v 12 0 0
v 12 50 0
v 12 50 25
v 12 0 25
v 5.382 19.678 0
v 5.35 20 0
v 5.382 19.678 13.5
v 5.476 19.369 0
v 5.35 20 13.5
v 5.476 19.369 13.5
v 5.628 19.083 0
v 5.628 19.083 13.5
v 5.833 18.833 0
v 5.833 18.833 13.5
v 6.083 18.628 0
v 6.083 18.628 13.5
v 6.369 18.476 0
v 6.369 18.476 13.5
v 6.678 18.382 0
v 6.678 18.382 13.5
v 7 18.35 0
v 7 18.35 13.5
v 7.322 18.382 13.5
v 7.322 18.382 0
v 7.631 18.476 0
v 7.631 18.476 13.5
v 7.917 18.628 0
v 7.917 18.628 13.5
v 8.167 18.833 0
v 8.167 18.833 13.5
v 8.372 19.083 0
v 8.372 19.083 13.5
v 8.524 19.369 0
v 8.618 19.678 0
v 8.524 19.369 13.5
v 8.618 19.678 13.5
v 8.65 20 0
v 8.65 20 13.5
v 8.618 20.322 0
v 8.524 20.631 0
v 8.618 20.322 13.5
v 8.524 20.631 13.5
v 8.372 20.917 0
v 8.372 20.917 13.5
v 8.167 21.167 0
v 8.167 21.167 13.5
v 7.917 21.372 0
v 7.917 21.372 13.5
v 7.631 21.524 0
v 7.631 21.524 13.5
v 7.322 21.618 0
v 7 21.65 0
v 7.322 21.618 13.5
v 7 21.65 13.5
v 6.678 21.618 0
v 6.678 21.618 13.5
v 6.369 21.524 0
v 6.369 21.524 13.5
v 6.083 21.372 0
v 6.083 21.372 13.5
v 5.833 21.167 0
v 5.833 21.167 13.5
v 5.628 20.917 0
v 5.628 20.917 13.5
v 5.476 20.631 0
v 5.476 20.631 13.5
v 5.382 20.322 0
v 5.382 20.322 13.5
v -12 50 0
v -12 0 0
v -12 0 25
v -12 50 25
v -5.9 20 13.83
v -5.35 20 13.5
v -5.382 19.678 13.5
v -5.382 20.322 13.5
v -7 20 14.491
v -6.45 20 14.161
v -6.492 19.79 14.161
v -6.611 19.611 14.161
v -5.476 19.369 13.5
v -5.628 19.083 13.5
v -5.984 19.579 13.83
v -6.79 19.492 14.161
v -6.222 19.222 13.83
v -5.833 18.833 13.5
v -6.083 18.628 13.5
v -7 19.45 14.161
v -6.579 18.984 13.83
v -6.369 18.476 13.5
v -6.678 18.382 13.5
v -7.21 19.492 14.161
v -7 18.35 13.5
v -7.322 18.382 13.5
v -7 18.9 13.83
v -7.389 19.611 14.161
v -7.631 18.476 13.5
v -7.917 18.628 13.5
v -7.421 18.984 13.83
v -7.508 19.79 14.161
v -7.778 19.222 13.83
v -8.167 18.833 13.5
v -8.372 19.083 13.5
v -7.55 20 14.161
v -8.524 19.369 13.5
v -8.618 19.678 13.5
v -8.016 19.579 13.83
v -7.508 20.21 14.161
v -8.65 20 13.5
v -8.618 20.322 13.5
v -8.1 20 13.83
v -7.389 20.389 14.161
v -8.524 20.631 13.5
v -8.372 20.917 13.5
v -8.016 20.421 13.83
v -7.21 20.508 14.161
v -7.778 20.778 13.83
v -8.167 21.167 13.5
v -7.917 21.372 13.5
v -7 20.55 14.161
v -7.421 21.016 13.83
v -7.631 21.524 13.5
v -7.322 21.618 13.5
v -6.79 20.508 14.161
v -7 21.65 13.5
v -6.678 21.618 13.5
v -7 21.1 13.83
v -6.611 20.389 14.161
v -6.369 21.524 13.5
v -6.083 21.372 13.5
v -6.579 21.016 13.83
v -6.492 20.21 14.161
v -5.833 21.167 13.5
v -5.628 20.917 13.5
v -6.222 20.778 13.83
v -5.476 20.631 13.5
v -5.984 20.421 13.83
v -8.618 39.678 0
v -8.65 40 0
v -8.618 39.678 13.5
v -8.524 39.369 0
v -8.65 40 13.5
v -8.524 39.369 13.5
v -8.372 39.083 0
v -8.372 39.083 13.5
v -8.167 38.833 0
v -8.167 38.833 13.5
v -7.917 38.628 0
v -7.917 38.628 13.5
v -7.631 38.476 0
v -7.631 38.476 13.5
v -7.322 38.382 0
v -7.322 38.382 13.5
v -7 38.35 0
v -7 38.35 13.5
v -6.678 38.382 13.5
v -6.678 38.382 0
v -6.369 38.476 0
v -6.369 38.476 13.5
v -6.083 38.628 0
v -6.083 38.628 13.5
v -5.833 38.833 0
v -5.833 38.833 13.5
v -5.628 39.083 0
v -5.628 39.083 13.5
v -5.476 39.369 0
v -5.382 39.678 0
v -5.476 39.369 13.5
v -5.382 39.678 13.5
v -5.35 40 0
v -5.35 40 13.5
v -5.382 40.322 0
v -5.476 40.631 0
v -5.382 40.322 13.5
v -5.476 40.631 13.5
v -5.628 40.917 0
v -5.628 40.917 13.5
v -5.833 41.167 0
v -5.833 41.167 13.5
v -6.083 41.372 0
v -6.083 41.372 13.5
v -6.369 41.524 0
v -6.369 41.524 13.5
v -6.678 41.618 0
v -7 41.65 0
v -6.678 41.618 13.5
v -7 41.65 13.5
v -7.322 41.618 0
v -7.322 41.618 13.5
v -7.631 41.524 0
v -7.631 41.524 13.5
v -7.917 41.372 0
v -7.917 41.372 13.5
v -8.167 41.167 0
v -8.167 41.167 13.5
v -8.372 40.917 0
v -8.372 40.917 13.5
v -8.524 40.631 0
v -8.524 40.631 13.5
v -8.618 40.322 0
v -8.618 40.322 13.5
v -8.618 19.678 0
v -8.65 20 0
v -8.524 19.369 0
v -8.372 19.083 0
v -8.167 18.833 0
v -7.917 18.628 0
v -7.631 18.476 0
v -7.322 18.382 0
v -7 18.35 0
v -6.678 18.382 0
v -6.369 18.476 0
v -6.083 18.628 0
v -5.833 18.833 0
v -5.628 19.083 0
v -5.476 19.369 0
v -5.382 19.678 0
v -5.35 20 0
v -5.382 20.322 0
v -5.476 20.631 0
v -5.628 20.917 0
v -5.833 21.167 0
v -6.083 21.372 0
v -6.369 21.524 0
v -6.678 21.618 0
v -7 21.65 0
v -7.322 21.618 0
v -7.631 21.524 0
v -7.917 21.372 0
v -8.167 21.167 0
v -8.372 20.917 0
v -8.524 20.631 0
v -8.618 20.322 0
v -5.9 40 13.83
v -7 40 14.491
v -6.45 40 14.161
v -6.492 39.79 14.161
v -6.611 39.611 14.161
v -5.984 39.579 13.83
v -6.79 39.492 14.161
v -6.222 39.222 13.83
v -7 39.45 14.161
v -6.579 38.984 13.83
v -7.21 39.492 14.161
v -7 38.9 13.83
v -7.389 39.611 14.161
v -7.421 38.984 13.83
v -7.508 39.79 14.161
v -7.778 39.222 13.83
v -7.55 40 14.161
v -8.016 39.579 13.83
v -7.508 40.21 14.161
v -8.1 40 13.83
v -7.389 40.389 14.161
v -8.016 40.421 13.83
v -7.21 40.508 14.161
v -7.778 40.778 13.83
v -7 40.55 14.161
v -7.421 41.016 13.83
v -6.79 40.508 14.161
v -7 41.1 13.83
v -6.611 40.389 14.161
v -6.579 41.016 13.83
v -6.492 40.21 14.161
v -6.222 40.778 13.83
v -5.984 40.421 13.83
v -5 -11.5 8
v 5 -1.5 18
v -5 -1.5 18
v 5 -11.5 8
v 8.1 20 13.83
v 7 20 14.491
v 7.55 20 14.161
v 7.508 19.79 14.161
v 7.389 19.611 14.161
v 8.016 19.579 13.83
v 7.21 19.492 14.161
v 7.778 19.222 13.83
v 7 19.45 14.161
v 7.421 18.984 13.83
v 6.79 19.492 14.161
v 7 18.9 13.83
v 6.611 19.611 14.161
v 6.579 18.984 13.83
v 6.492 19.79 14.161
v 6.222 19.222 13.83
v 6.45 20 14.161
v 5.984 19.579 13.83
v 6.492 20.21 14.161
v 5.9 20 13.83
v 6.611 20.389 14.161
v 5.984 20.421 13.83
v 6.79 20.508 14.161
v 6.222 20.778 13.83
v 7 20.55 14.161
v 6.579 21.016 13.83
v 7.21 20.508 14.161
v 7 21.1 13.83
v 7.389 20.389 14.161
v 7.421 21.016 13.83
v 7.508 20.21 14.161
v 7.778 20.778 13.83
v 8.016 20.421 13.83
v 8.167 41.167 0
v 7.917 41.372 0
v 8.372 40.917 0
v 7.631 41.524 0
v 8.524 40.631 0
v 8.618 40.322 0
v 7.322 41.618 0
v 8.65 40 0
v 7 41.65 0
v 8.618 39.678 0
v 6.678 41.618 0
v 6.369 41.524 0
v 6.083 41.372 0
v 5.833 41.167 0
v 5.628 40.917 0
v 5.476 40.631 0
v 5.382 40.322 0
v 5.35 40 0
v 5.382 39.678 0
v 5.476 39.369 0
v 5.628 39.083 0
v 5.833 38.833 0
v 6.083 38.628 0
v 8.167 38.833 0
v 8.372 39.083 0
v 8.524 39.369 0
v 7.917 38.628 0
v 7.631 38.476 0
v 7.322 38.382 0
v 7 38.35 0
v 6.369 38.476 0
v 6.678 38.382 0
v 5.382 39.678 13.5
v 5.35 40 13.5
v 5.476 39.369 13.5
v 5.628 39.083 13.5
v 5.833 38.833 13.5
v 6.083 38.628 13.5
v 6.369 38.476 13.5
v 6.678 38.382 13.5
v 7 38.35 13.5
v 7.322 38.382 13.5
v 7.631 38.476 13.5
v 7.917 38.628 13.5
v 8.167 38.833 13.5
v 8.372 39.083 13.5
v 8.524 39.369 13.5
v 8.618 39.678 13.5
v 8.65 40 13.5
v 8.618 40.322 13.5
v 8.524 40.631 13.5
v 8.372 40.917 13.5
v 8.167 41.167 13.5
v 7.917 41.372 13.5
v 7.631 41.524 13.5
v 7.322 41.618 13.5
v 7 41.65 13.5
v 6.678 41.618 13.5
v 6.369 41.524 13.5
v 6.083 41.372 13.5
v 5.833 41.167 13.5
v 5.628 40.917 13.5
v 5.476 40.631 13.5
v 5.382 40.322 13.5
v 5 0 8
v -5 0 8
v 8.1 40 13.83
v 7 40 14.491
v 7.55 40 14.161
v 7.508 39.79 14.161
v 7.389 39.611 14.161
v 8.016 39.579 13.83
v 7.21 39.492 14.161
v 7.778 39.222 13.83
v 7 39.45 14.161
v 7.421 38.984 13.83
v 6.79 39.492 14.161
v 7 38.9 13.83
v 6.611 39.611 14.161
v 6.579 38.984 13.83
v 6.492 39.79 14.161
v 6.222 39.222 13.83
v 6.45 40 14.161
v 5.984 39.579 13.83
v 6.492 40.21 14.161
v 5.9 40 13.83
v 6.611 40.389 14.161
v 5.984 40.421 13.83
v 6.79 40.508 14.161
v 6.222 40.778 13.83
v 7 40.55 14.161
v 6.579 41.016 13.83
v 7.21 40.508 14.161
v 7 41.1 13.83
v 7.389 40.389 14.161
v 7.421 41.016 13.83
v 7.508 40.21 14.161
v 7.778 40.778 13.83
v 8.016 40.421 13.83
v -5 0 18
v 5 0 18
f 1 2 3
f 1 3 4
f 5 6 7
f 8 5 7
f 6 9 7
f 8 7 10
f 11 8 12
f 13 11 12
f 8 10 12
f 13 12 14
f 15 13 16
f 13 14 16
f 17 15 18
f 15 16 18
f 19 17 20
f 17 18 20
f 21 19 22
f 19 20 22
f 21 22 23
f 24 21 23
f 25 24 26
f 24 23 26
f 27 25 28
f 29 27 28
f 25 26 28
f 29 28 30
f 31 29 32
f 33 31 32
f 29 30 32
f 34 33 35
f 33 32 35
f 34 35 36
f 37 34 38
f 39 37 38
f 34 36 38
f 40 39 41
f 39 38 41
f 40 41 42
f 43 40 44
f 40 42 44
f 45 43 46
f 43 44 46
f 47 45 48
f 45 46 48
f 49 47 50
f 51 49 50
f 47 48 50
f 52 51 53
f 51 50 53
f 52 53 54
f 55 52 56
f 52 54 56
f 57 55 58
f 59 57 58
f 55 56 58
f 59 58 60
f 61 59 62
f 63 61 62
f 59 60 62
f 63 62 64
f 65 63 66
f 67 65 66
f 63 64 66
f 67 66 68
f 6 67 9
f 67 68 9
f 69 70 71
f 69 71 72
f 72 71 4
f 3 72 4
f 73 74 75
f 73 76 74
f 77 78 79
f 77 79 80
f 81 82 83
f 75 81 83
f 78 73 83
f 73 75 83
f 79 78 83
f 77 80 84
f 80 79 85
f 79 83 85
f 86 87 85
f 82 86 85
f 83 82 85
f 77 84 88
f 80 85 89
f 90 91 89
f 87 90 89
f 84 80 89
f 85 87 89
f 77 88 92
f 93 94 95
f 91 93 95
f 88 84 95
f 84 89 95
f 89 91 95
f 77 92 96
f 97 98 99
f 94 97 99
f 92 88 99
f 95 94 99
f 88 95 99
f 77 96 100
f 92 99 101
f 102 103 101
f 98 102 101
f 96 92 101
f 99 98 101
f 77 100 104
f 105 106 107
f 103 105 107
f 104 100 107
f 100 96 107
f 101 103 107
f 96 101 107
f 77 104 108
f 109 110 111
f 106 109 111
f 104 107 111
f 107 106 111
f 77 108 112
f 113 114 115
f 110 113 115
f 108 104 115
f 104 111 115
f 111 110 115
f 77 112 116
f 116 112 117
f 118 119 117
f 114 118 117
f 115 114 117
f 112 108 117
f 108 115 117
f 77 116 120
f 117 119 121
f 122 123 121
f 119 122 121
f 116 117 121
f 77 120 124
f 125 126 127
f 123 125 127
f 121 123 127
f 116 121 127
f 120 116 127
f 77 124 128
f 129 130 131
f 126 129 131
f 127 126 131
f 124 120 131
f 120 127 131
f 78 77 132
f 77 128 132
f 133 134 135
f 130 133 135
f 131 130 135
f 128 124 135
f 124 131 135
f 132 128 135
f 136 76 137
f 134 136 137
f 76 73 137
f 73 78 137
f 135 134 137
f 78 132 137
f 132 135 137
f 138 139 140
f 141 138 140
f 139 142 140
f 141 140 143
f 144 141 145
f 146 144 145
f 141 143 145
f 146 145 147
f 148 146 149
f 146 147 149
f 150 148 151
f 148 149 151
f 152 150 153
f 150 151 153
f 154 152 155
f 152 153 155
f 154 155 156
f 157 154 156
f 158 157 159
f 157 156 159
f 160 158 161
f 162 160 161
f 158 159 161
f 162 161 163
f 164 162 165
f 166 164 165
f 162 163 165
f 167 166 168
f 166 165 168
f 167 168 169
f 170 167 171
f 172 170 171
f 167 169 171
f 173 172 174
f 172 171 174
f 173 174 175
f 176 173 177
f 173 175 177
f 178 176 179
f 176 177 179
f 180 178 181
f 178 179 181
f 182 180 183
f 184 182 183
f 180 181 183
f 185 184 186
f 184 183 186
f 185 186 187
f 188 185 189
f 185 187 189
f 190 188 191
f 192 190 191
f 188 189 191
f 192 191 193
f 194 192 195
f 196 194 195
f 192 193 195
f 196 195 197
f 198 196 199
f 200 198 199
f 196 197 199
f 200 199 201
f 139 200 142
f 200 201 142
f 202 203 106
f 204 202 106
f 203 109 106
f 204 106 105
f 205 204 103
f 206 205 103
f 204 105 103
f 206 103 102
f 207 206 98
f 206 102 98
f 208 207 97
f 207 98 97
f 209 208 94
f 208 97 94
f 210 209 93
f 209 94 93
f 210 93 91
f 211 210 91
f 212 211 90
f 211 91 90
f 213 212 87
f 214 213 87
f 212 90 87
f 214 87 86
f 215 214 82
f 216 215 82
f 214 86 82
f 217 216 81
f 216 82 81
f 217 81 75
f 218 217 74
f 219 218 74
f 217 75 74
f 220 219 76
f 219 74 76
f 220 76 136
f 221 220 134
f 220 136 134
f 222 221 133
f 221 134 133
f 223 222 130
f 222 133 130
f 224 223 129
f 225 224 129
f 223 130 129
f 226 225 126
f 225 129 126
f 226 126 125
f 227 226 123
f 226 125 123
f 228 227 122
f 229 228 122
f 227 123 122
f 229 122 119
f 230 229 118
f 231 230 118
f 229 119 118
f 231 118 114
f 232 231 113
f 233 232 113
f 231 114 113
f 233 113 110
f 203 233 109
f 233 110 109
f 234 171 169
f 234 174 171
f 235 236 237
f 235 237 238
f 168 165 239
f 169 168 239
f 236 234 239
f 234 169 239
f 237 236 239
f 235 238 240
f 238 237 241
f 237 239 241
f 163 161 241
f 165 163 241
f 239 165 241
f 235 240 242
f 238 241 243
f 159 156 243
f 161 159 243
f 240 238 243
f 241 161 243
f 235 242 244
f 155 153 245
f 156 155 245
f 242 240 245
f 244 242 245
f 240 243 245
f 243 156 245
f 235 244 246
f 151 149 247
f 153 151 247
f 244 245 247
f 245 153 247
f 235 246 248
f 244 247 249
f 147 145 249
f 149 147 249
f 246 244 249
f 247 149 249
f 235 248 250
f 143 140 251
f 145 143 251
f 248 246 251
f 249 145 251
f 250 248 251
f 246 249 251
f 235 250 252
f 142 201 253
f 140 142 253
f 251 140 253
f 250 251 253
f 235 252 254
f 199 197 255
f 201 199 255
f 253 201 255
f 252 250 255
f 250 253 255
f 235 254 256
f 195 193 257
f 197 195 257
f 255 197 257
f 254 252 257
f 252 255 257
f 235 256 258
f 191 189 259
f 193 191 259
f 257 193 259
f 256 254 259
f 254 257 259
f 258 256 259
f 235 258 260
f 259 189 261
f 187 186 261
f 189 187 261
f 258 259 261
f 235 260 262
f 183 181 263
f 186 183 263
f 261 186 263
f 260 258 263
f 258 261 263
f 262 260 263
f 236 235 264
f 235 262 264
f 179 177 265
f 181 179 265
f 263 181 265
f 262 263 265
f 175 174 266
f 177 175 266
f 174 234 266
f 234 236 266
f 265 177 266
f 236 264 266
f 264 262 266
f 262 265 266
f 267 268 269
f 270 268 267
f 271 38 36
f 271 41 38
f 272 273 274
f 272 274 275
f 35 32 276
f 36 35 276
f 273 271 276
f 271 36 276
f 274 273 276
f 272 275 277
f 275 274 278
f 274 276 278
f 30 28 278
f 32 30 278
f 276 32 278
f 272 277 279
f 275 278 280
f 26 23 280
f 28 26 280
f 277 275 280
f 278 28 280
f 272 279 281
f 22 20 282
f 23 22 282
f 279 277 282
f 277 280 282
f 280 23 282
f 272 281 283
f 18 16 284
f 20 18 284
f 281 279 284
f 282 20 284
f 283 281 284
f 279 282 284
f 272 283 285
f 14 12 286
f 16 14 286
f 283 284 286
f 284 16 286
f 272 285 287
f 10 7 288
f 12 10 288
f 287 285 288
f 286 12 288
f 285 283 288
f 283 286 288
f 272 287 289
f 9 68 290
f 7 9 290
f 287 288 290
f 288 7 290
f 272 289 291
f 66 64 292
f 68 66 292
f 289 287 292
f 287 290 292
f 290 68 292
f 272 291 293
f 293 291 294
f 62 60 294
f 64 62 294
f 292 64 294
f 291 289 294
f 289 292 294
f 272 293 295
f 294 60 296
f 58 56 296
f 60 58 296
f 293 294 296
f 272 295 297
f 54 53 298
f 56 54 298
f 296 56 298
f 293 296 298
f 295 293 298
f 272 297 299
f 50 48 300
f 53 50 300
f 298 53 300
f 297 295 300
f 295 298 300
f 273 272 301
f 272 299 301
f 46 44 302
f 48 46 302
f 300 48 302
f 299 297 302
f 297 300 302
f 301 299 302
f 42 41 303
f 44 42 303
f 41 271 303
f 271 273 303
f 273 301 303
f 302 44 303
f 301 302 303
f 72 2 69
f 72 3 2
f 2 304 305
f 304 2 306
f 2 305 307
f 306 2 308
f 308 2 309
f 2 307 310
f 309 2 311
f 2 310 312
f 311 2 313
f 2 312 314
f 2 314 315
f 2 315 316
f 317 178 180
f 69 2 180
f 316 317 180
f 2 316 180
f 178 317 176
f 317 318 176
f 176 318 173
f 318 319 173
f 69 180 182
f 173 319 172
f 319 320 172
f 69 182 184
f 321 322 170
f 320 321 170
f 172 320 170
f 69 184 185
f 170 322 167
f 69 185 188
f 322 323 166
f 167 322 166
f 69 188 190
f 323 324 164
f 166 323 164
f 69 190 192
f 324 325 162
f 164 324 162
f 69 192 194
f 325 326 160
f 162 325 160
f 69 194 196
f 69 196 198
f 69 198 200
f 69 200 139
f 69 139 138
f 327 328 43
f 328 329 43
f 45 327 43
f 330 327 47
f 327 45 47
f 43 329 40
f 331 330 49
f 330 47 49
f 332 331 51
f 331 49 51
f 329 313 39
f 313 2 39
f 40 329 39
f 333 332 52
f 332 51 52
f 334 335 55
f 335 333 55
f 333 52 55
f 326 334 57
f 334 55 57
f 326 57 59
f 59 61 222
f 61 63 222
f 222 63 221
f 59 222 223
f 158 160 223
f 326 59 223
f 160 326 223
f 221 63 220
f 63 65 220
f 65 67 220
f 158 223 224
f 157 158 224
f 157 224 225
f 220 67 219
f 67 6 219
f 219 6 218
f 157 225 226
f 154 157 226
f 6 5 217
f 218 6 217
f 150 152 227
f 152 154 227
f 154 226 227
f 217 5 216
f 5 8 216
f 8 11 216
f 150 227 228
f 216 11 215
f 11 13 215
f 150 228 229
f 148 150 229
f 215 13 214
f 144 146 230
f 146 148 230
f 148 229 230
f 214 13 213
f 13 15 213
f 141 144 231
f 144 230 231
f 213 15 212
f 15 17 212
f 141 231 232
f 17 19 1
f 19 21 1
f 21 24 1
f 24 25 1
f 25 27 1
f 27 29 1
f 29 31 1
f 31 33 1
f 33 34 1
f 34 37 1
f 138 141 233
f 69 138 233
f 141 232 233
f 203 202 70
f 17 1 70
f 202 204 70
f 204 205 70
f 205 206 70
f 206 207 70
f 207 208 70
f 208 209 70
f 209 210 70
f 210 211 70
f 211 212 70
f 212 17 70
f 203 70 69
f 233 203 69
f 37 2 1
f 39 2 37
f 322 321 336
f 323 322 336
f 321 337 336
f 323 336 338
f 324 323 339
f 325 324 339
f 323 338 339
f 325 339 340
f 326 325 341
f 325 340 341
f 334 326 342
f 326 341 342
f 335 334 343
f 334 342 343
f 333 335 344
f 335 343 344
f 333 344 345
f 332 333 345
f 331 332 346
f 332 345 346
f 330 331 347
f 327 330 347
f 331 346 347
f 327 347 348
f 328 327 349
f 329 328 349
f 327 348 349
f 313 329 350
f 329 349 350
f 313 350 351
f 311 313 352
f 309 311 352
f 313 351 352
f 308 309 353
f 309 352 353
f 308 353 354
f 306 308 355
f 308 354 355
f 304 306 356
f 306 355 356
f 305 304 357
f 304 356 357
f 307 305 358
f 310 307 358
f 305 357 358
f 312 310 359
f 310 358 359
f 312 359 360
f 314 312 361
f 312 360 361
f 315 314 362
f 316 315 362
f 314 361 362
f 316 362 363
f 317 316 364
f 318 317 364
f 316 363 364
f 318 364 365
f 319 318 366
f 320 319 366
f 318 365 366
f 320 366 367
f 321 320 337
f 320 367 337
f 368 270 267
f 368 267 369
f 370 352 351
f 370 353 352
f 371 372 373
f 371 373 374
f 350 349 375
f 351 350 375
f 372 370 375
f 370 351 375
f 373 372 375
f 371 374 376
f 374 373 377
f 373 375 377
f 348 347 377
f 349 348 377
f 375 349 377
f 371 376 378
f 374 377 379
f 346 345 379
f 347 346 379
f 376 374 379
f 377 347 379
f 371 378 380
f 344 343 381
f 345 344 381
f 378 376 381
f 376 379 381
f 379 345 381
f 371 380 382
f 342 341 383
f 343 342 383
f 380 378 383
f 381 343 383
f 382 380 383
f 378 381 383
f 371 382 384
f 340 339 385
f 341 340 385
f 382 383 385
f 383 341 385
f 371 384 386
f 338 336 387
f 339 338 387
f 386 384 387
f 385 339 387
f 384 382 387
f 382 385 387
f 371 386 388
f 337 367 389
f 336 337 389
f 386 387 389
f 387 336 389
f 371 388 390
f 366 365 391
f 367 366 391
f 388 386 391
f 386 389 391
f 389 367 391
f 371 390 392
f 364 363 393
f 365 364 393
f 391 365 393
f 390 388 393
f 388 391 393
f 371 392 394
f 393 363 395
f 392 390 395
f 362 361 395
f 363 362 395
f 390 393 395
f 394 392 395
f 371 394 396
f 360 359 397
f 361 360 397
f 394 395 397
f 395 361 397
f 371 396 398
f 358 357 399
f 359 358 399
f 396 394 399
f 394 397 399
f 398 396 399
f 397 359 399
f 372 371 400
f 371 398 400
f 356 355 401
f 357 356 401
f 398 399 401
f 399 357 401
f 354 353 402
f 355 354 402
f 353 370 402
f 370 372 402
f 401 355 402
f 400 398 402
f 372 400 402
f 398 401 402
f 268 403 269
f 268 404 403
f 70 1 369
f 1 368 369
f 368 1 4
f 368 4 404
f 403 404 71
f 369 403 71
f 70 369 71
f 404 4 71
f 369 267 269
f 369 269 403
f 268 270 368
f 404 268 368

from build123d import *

# Parameters (mm, degrees)
F1_DEPTH = 50
F4_DEPTH = 5
F6_DEPTH = 25
F8_D     = 3.3
F8_DEPTH = 13.5
F8_TIP   = 0.9914200214


with BuildPart() as f1:
    # F0 (on Front) → F1 (new body)
    with BuildSketch(Plane.XZ):
        Polygon((0, 0), (21, 0), (21, 1), (12, 1), (12, 28), (0, 28), align=None)
    extrude(amount=-F1_DEPTH)

    # F2: F1 across plane


with BuildPart() as f1_1:
    add(f1.part)
    add(f1.part.mirror(Plane.YZ))

    # F3 (on Right) → F4 (join, symmetric)
    with BuildSketch(Plane.YZ):
        Polygon((0, 18), (-1.5, 18), (-11.5, 8), (0, 8), align=None)
    extrude(amount=F4_DEPTH, both=True)

    # F5 (on face) → F6 (intersect)
    with BuildSketch(Plane(origin=(0, 0, 0), x_dir=(1, 0, 0), z_dir=(0, 0, -1))):
        Polygon((-12, 0), (-12, -50), (12, -50), (12, 0), (12, 11.5), (-12, 11.5), align=None)
    extrude(amount=-F6_DEPTH, mode=Mode.INTERSECT)

    # F8
    with Locations(Plane(origin=(0, 0, 0), x_dir=(1, 0, 0), z_dir=(0, 0, -1))):
        with Locations((7, -20), (7, -40), (-7, -40), (-7, -20)):
            Hole(F8_D / 2, depth=F8_DEPTH)
            with Locations((0, 0, -(F8_DEPTH + F8_TIP / 2))):  # 118° drill point
                Cone(0, F8_D / 2, F8_TIP, mode=Mode.SUBTRACT)


solid = f1_1.part
